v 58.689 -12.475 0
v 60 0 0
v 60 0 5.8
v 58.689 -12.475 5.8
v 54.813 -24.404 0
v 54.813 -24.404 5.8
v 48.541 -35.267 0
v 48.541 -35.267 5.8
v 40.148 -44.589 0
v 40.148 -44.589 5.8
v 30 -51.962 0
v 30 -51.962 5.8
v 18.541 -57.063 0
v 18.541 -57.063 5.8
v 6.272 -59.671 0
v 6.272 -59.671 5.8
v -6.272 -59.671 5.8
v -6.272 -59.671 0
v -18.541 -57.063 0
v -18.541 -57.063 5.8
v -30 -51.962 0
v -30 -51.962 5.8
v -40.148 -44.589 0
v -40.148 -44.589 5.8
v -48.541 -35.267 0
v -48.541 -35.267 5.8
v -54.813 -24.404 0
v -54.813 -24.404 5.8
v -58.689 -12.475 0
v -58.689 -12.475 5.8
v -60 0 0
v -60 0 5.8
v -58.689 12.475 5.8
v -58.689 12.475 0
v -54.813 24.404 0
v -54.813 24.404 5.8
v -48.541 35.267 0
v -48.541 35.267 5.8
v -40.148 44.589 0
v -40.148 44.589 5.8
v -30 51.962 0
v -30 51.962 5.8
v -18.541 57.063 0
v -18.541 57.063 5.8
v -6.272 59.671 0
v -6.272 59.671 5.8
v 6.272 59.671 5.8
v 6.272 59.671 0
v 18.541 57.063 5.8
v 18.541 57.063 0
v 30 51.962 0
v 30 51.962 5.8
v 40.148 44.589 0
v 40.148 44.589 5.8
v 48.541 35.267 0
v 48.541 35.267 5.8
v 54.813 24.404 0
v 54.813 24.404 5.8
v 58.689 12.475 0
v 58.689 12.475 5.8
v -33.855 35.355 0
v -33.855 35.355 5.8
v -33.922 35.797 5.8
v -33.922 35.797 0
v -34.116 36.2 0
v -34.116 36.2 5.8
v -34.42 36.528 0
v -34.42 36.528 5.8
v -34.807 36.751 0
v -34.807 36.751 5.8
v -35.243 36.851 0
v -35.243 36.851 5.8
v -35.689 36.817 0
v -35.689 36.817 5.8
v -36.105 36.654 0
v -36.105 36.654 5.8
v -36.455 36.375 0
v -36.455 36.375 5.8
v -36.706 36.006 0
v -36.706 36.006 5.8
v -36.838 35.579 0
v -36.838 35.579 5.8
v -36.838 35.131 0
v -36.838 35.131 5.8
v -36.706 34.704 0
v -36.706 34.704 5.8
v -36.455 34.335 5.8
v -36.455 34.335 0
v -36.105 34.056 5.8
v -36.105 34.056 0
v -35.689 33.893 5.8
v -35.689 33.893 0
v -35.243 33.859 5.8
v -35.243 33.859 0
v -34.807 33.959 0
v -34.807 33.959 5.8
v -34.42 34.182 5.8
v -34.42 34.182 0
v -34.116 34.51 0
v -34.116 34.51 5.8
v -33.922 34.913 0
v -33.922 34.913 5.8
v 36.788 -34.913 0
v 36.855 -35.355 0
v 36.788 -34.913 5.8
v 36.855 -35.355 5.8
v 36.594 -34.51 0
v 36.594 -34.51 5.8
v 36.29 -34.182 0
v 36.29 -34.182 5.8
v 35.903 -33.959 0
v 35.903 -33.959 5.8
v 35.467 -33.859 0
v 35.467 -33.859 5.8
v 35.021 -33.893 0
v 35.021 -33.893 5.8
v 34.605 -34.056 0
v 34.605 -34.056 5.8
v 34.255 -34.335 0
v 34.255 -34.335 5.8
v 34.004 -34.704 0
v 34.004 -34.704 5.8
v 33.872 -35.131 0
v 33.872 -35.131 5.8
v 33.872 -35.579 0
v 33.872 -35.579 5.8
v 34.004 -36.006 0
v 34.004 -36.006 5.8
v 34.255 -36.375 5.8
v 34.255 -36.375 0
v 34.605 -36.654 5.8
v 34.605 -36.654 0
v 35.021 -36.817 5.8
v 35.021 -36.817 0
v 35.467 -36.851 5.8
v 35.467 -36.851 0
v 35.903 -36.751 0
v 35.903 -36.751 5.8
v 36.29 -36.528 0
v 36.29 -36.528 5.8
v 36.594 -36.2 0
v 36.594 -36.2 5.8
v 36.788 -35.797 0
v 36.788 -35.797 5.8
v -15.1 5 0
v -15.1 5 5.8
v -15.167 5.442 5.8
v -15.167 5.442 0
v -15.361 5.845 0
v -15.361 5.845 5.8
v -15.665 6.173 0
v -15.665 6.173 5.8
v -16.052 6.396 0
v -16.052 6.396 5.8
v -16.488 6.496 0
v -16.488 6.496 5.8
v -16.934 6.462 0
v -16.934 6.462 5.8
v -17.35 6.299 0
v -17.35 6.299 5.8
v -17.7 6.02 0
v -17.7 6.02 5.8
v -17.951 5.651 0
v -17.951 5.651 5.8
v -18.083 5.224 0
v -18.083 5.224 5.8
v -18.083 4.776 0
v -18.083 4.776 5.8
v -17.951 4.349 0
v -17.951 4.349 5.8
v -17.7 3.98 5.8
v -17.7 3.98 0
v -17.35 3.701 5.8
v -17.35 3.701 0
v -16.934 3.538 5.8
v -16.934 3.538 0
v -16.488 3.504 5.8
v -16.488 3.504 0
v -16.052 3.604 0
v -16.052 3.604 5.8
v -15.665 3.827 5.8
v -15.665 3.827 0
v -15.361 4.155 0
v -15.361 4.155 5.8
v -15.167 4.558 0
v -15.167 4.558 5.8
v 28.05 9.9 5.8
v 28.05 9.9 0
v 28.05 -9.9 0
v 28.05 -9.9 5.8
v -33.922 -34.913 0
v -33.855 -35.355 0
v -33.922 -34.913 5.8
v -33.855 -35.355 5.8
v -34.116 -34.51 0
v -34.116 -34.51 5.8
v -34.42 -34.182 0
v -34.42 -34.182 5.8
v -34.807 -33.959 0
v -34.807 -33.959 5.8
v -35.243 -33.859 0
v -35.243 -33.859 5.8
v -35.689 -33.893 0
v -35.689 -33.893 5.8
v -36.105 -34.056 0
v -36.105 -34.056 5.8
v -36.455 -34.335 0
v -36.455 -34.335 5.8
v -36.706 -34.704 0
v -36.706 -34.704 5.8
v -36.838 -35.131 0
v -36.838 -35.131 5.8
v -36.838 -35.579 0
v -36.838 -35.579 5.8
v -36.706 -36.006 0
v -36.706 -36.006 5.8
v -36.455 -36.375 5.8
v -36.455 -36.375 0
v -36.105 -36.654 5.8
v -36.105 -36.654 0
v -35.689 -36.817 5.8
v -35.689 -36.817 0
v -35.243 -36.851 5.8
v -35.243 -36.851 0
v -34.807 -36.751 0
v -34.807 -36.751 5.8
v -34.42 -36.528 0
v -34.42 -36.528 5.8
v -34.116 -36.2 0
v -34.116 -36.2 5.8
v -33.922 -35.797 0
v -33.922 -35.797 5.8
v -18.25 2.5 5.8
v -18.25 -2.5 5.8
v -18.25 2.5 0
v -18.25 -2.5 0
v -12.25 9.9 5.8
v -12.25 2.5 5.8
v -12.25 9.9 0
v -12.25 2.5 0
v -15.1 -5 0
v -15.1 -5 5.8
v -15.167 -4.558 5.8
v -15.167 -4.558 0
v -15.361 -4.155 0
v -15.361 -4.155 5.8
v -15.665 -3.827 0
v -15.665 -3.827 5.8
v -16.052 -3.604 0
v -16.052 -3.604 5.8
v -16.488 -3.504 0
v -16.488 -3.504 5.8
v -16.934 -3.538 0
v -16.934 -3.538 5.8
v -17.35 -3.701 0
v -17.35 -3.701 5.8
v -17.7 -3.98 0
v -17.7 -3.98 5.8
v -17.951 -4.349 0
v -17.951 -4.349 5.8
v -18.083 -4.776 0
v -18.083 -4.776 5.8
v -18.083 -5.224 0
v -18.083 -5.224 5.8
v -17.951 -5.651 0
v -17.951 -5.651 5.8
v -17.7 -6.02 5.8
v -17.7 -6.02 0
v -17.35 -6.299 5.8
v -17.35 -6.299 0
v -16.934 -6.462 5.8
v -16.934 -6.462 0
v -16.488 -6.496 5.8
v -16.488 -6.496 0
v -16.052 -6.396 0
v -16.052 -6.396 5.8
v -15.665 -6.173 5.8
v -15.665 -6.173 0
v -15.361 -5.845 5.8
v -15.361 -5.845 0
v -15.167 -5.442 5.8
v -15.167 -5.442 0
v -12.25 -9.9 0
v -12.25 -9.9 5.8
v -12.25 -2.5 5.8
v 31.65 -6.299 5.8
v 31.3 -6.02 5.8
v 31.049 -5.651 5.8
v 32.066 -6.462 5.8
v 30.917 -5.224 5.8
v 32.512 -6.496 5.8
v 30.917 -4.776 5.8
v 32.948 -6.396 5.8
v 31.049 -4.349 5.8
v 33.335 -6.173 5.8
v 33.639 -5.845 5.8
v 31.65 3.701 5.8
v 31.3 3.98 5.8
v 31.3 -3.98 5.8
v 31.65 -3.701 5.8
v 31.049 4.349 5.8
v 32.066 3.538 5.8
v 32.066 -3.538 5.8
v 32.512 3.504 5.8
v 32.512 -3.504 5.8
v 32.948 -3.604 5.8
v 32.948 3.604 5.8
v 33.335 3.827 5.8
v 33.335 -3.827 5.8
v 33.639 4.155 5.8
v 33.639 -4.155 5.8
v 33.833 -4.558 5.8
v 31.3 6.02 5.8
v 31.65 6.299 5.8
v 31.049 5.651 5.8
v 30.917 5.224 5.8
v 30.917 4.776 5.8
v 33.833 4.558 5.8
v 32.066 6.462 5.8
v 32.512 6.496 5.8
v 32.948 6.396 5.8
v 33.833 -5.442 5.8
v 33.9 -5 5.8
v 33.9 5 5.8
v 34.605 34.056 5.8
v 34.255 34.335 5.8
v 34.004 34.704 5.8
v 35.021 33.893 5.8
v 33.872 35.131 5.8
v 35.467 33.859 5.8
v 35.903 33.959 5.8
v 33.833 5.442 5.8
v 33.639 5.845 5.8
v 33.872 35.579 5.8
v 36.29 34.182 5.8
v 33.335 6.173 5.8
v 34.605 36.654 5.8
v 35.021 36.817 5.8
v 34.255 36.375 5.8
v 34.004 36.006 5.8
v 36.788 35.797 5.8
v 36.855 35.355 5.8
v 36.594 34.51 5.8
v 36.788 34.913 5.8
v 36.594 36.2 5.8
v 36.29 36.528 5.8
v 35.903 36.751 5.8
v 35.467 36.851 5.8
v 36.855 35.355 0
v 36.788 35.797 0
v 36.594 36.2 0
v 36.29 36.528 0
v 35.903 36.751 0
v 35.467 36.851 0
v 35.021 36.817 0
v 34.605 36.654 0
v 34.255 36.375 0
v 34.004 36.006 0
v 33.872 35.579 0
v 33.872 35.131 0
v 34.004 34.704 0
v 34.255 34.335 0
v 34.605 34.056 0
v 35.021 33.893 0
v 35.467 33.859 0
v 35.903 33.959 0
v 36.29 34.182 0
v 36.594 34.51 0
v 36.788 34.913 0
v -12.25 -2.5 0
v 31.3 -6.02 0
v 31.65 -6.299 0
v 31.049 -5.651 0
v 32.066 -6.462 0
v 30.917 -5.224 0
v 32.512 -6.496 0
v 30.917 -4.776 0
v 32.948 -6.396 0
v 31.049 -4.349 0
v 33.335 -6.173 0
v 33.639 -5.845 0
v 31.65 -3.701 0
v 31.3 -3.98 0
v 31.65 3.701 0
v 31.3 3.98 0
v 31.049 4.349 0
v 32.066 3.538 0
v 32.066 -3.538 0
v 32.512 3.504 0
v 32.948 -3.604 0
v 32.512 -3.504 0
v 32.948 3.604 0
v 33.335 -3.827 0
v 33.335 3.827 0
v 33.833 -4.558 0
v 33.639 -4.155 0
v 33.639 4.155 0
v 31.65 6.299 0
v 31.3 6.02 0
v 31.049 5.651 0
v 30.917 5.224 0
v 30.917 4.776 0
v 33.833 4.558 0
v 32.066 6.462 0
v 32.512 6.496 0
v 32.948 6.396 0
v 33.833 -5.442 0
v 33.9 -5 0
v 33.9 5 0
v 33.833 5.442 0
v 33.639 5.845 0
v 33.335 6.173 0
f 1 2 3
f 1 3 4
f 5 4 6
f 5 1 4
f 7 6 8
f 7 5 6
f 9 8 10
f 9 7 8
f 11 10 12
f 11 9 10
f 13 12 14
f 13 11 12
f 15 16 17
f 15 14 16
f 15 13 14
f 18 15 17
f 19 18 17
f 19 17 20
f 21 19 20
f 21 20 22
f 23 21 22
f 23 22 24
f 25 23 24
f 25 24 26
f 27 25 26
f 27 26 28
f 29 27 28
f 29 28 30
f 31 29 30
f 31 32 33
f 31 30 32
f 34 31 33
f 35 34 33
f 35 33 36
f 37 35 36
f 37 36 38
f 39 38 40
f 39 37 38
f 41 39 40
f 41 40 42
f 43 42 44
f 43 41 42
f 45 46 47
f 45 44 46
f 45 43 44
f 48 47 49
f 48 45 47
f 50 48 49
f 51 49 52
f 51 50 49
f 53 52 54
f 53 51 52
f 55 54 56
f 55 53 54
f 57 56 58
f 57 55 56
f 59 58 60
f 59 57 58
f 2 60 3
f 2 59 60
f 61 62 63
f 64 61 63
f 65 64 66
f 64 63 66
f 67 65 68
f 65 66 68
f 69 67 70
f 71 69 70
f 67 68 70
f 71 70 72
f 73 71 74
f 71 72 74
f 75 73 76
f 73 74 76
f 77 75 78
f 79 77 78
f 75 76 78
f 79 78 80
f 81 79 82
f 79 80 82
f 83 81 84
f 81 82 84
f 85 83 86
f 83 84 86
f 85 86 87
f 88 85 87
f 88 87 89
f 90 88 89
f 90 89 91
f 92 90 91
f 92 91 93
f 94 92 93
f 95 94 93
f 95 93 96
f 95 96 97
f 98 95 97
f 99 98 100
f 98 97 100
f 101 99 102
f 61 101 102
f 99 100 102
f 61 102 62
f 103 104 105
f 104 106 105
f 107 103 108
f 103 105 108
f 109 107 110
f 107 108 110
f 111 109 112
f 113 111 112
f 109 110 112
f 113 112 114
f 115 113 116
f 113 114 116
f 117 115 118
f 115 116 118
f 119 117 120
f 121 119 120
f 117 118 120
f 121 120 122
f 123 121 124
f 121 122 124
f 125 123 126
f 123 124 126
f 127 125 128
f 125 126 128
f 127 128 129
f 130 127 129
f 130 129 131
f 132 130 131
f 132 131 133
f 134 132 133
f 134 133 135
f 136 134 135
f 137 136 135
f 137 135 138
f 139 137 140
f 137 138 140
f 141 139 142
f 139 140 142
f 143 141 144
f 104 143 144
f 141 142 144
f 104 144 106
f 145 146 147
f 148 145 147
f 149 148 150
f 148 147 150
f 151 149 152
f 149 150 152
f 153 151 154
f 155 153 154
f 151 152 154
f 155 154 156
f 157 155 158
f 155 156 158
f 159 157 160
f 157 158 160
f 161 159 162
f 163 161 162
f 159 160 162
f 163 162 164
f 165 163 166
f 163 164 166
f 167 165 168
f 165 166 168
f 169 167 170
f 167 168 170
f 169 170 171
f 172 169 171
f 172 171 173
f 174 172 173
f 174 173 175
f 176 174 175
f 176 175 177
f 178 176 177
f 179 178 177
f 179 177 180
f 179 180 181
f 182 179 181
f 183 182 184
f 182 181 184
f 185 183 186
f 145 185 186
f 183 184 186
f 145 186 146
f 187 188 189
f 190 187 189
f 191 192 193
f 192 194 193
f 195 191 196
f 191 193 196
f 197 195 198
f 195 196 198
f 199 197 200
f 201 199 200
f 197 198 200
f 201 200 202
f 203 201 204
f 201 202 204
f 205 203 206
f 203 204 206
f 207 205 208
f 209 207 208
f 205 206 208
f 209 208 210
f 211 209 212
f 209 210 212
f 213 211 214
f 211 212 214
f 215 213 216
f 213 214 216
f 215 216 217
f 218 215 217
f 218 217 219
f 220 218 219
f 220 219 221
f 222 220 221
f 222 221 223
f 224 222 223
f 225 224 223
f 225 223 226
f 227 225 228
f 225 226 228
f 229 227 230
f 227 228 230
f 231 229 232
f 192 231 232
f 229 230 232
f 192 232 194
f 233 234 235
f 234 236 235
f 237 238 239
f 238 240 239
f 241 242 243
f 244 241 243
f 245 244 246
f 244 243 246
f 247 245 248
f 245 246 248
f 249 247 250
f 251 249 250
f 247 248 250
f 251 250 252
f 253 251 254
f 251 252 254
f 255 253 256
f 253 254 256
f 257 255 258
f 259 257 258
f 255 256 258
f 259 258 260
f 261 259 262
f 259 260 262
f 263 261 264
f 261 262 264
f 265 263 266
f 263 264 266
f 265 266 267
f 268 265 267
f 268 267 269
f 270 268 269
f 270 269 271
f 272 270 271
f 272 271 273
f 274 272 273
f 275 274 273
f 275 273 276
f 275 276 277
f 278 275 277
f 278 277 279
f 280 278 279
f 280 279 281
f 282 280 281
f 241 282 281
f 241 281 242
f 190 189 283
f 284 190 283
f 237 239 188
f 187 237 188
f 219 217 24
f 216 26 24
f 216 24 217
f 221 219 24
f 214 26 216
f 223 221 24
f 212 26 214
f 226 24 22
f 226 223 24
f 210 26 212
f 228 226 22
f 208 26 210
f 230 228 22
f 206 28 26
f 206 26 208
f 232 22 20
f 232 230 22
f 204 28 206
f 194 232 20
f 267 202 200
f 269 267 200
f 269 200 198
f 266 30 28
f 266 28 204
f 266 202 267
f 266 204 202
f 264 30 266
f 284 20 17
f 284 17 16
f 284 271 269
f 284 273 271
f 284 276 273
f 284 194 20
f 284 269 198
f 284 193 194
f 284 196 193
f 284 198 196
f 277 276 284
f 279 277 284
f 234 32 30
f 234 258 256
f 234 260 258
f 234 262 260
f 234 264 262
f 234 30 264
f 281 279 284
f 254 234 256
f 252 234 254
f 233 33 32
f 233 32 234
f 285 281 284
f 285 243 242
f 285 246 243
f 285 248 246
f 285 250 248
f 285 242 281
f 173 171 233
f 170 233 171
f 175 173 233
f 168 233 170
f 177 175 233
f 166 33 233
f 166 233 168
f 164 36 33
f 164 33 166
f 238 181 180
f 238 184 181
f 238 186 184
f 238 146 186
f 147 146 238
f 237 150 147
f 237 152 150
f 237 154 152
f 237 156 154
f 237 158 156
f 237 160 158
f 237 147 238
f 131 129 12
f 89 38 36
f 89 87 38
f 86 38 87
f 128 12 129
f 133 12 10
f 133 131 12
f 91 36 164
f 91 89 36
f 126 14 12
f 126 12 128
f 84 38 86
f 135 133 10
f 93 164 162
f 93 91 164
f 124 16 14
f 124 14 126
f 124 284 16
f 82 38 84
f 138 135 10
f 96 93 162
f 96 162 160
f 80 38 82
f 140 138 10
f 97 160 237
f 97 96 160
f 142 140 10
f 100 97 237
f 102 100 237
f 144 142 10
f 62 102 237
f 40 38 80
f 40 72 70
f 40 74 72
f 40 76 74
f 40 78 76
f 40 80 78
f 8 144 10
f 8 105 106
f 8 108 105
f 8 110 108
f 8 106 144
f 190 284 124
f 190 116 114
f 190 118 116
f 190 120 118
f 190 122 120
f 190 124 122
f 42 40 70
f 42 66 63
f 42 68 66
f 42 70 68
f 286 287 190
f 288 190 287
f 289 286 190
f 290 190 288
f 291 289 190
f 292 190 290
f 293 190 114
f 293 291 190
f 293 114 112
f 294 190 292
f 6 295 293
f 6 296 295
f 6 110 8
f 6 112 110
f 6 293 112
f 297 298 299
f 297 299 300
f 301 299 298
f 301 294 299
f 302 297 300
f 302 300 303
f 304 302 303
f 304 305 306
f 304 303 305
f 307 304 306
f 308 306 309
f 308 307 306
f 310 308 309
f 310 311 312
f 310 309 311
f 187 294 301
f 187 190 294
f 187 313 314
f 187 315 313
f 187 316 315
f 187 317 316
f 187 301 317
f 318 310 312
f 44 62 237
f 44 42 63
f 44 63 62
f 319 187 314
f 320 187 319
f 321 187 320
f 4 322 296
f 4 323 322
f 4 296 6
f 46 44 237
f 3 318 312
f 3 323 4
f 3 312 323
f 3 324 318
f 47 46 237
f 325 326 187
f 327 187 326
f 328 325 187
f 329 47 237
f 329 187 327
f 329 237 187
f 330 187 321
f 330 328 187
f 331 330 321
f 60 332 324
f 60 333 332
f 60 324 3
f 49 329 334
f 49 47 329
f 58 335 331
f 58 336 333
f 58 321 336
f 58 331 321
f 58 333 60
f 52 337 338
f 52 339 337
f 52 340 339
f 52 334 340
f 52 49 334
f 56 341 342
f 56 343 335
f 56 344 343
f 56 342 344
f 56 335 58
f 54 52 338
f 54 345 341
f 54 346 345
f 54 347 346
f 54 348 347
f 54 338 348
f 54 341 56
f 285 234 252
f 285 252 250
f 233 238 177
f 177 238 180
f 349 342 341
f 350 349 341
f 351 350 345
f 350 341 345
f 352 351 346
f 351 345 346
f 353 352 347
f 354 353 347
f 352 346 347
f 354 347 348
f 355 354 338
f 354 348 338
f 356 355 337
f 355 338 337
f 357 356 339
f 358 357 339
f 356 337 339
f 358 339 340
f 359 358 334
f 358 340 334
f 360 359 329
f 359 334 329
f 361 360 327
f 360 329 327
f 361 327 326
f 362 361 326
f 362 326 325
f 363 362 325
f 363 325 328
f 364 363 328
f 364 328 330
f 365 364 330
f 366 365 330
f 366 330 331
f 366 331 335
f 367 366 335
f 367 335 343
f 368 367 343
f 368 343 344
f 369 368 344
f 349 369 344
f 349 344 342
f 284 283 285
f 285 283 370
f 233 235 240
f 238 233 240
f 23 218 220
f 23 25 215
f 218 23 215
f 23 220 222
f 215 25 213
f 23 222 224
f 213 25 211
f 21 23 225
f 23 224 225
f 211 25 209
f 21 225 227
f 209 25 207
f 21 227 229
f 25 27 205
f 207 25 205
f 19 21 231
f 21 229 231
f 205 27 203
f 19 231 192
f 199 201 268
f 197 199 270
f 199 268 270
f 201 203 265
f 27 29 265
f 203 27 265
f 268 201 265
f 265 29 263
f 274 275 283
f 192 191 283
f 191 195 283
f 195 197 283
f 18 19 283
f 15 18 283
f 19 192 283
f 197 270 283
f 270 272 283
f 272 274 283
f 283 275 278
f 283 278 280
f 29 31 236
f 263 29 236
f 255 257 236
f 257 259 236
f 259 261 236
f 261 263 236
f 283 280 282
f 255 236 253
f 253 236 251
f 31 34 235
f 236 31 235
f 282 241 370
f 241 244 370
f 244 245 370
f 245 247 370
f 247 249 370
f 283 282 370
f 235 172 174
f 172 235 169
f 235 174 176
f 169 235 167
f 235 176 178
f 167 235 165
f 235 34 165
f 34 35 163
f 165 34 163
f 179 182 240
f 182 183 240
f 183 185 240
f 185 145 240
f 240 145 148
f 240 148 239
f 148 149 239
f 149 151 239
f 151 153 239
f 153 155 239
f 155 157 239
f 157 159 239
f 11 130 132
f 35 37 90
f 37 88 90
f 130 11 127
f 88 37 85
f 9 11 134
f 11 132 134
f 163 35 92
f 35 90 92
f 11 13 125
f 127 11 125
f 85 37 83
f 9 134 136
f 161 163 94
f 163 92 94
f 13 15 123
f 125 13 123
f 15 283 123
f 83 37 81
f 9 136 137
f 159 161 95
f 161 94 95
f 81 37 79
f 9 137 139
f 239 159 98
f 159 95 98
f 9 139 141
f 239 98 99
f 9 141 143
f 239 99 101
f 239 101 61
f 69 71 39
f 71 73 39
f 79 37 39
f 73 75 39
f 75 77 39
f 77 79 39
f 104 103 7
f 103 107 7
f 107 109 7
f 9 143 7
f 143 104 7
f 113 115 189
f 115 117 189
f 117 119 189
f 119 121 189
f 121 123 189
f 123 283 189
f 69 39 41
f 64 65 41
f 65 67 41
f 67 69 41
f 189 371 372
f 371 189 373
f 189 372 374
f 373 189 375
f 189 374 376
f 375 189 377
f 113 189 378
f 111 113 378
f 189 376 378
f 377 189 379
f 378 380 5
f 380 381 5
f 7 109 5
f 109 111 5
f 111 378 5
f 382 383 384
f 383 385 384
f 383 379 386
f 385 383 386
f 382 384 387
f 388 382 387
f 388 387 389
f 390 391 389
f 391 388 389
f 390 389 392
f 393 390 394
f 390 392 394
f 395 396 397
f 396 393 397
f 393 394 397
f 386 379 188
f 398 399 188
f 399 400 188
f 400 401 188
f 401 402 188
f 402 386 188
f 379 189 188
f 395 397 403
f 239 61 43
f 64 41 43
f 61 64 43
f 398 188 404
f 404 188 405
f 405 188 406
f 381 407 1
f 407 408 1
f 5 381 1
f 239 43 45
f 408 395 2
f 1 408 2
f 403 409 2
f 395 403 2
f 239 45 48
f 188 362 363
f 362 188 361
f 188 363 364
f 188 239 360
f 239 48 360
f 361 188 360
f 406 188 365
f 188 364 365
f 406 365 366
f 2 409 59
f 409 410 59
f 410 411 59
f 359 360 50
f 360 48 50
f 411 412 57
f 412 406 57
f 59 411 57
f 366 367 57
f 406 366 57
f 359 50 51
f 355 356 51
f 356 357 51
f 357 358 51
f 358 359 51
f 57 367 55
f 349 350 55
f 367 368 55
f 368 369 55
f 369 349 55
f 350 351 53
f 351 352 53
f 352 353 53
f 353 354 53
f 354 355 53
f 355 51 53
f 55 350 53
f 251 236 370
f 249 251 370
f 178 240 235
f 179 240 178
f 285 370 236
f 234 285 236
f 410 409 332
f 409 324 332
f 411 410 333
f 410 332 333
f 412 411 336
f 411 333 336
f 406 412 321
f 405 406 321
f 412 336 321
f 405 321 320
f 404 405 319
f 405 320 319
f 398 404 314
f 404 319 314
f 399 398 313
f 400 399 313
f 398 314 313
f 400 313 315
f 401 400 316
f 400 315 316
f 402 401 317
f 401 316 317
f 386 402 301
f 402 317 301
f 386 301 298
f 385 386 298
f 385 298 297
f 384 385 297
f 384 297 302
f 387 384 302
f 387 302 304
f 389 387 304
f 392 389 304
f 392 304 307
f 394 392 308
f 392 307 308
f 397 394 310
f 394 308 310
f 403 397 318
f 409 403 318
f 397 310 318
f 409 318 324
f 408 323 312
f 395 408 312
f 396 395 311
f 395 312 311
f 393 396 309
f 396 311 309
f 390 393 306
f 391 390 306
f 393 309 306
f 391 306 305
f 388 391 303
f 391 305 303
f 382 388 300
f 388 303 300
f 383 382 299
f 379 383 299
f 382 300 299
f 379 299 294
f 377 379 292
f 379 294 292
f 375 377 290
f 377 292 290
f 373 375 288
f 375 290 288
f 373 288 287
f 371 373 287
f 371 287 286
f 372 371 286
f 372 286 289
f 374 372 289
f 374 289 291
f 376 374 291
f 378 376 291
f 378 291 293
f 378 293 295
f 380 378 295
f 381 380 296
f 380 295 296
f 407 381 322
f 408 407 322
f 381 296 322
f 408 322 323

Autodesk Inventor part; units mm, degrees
ref_plane "YZ Plane" through (0, 0, 0) normal (1, 0, 0) x (0, 1, 0)
ref_plane "XZ Plane" through (0, 0, 0) normal (0, 1, 0) x (-1, 0, 0)
ref_plane "XY Plane" through (0, 0, 0) normal (0, 0, 1) x (1, 0, 0)
sketch "Sketch1" plane through (0, 0, 0) normal (0, 0, 1) x (1, 0, 0)
  circle A0 centre (0, 0) radius 60
  dimension "d0" = 120
extrude "Extrusion1" add sketch "Sketch1" along normal blind 5.8
sketch "Sketch2" plane through (0, 0, 5.8) normal (0, 0, 1) x (1, 0, 0)
  circle A0 centre (0, 0) radius 60 projected
  circle A1 centre (0, 0) radius 6.4031
extrude "Extrusion2" cut sketch "Sketch2" against normal through all contours A1
sketch "Sketch3" plane through (0, 0, 0) normal (0, 0, -1) x (-1, 0, 0)
  circle A0 centre (0, 0) radius 6.4031 projected
  circle A1 centre (0, 0) radius 3
  line L0 (12.25, 9.9) -> (-28.05, 9.9)
  line L1 (-28.05, -9.9) -> (12.25, -9.9)
  line L2 (-28.05, 9.9) -> (-28.05, -9.9)
  line L3 (18.25, 2.5) -> (12.25, 2.5)
  line L4 (18.25, -2.5) -> (18.25, 2.5)
  line L5 (12.25, -2.5) -> (18.25, -2.5)
  line L6 (12.25, 2.5) -> (12.25, 9.9)
  line L7 (12.25, -9.9) -> (12.25, -2.5)
extrude "Extrusion3" cut sketch "Sketch3" against normal through all contours L6 L3 L4 L5 L7 L1 L2 L0
sketch "Sketch4" plane through (0, 0, 5.8) normal (0, 0, 1) x (1, 0, 0)
  circle A0 centre (-16.6, 5) radius 2.5
  circle A1 centre (-16.6, -5) radius 2.5
  circle A2 centre (32.4, -5) radius 2.5
  circle A3 centre (32.4, 5) radius 2.5
  circle A4 centre (-16.6, 5) radius 1.5
  circle A5 centre (-16.6, -5) radius 1.5
  circle A6 centre (32.4, 5) radius 1.5
  circle A7 centre (32.4, -5) radius 1.5
  dimension "d7" = 3
  dimension "d8" = 3
  dimension "d9" = 3
  dimension "d10" = 3
extrude "Extrusion4" cut sketch "Sketch4" against normal through all contours A4 | A5 | A6 | A7
sketch "Sketch5" plane through (0, 0, 5.8) normal (0, 0, 1) x (1, 0, 0)
  circle A0 centre (0, 0) radius 60 projected
  circle A1 centre (-35.355, 35.355) radius 1.5
  line L0 (0, -84) -> (0, 84) projected
  line L1 (-84, 0) -> (84, 0) projected
  circle A2 centre (-35.355, -35.355) radius 1.5
  circle A3 centre (35.355, -35.355) radius 1.5
  circle A4 centre (35.355, 35.355) radius 1.5
  dimension "d13" = 3
  dimension "d15" = 35.355
  dimension "d17" = 35.355
  dimension "d20" = 360
extrude "Extrusion5" cut sketch "Sketch5" against normal through all contours A1 | A2 | A3 | A4
sketch "Sketch6" plane through (0, 0, 0) normal (0, 0, -1) x (-1, 0, 0)
  circle A0 centre (-35.355, 35.355) radius 1.5 projected
  circle A1 centre (-35.355, -35.355) radius 1.5 projected
  circle A2 centre (35.355, -35.355) radius 1.5 projected
  circle A3 centre (35.355, 35.355) radius 1.5 projected
  circle A4 centre (-32.4, 5) radius 1.5 projected
  circle A5 centre (16.6, -5) radius 1.5 projected
  circle A6 centre (16.6, 5) radius 1.5 projected
  circle A7 centre (-32.4, -5) radius 1.5 projected
  line L0 (-28.05, -9.9) -> (-28.05, 9.9) projected
  line L1 (-28.05, 9.9) -> (12.25, 9.9) projected
  line L2 (12.25, 9.9) -> (12.25, 2.5) projected
  line L3 (12.25, 2.5) -> (18.25, 2.5) projected
  line L4 (18.25, 2.5) -> (18.25, -2.5) projected
  line L5 (18.25, -2.5) -> (12.25, -2.5) projected
  line L6 (12.25, -2.5) -> (12.25, -9.9) projected
  line L7 (12.25, -9.9) -> (-28.05, -9.9) projected
  circle A8 centre (0, 0) radius 60 projected
  circle A9 centre (35.355, 35.355) radius 1.385
  circle A10 centre (-35.355, 35.355) radius 1.5 projected
  circle A11 centre (-35.355, -35.355) radius 1.5 projected
  circle A12 centre (35.355, -35.355) radius 1.5 projected
  circle A13 centre (35.355, 35.355) radius 1.5 projected
  circle A14 centre (-32.4, 5) radius 1.5 projected
  circle A15 centre (16.6, -5) radius 1.5 projected
  circle A16 centre (16.6, 5) radius 1.5 projected
  circle A17 centre (-32.4, -5) radius 1.5 projected
  line L8 (-28.05, -9.9) -> (-28.05, 9.9) projected
  line L9 (-28.05, 9.9) -> (12.25, 9.9) projected
  line L10 (12.25, 9.9) -> (12.25, 2.5) projected
  line L11 (12.25, 2.5) -> (18.25, 2.5) projected
  line L12 (18.25, 2.5) -> (18.25, -2.5) projected
  line L13 (18.25, -2.5) -> (12.25, -2.5) projected
  line L14 (12.25, -2.5) -> (12.25, -9.9) projected
  line L15 (12.25, -9.9) -> (-28.05, -9.9) projected
  circle A18 centre (0, 0) radius 60 projected
  line L16 (-28.05, 9.9) -> (-28.05, -9.9) projected
  line L17 (-28.05, -9.9) -> (-28.05, 9.9) projected
  line L18 (12.25, 9.9) -> (-28.05, 9.9) projected
  line L19 (-28.05, 9.9) -> (12.25, 9.9) projected
  circle A19 centre (-32.4, -5) radius 1.5 projected
  circle A20 centre (-32.4, -5) radius 1.5 projected
  circle A21 centre (35.355, -35.355) radius 1.385
  circle A22 centre (-35.355, 35.355) radius 1.385
  circle A23 centre (-35.355, -35.355) radius 1.385
equation "\"d17\" = d15"
properties part number "Acrylic_rotationServoMount"
